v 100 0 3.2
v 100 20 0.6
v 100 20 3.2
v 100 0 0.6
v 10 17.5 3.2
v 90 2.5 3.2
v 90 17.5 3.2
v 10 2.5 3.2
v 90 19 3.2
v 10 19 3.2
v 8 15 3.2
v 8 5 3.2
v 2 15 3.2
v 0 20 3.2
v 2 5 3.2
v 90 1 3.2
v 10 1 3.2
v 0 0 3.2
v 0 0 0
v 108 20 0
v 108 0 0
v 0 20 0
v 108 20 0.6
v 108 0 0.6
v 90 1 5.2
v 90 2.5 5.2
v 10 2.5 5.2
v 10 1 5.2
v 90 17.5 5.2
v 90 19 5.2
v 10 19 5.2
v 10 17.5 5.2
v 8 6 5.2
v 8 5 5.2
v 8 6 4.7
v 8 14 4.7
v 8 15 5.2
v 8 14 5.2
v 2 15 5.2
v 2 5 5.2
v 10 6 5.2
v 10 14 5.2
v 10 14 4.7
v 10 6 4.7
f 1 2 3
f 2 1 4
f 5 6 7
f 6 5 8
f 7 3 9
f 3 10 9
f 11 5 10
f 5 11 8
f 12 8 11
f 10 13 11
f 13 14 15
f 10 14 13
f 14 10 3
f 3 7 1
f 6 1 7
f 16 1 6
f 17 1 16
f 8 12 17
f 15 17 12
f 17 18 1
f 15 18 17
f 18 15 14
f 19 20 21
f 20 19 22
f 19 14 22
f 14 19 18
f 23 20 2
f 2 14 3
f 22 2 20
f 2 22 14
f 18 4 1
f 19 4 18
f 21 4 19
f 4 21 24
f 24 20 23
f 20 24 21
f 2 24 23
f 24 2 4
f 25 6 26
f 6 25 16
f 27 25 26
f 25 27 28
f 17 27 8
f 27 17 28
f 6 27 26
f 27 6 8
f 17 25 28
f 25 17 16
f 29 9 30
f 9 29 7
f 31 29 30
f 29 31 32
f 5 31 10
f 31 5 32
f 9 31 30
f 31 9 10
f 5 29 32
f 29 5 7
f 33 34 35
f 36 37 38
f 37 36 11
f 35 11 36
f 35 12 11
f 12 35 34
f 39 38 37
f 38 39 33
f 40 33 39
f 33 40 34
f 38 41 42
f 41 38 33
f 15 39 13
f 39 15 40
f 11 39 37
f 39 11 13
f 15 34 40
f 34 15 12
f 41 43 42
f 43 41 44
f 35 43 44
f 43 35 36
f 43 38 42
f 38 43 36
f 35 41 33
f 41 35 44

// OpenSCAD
// Bag clip living hinge, PETG, 0.4 nozzle, no supports.
// Two halves contacting at hinge mid-plane, open flat pose.
// Fold map 180 about pivot: F(x)=216-x, F(z)=10.4-z.

part = "arm_lower"; // [arm_lower, arm_upper, assembly]
cadverify_only = "";

Lbody = 100;
Wbody = 20;
Tbody = 3.2;
Hhalf = 8;
Thinge = 0.6;
Bgap = 2.0;

module instance(name, part, unit = 1) {
    echo(cadverify_instance = [name, part, unit]);
    if (cadverify_only == "" || cadverify_only == name) children();
}

module arm_lower() {
    cube([100, 20, 3.2], false);
    translate([99.9, 0, 0]) cube([8.1, 20, 0.6], false);
    translate([10, 1, 3.1]) cube([80, 1.5, 2.1], false);
    translate([10, 17.5, 3.1]) cube([80, 1.5, 2.1], false);
    translate([2, 5, 3.1]) cube([6, 10, 2.1], false);
    translate([7.9, 6, 4.7]) cube([2.1, 8, 0.5], false);
}

module arm_upper() {
    cube([8.1, 20, 0.6], false);
    translate([7.9, 0, 0]) cube([100.1, 20, 3.2], false);
    translate([100, 5, 3.1]) cube([6, 10, 3.1], false);
    translate([97.9, 6, 5.7]) cube([2.5, 8, 0.5], false);
    translate([107.9, 6, 0]) cube([8.1, 8, 3.2], false);
}

if (part == "arm_lower") {
    echo(cadverify_spec = [
        ["bounds", [[0, 0, 0], [108, 20, 5.2]]],
        ["bodies", 1],
        ["through_holes", 0],
        ["support_faces", [["bed", "-z", 1500]]],
        ["overhangs_allowed", [["latch lip", [[7.5, 5.5, 4.5], [10.5, 14.5, 5.5]]]]],
        ["copies", 1],
        ["details", [
            ["arm", "material", [[30, 8, 1.2], [70, 12, 2.0]], 1],
            ["arm_wall", "thickness", [50, 10, 10], [0, 0, -1], 3.2],
            ["hinge", "thickness", [104, 10, 5], [0, 0, -1], 0.6],
            ["rib", "material", [[30, 1.3, 3.8], [70, 2.2, 4.8]], 1],
            ["rib2", "material", [[30, 17.8, 3.8], [70, 18.7, 4.8]], 1],
            ["latch_tower", "material", [[3, 7, 3.8], [7, 13, 5.0]], 1],
            ["latch_lip", "material", [[8.3, 7, 4.8], [9.6, 13, 5.1]], 1],
            ["bag_slot", "void", [[30, 4, 3.8], [70, 16, 5.0]], 1]
        ]]
    ]);
    arm_lower();
} else if (part == "arm_upper") {
    echo(cadverify_spec = [
        ["bounds", [[0, 0, 0], [116, 20, 6.2]]],
        ["bodies", 1],
        ["through_holes", 0],
        ["support_faces", [["bed", "-z", 1500]]],
        ["overhangs_allowed", [["latch lip", [[97.5, 5.5, 5.5], [100.8, 14.5, 6.5]]]]],
        ["copies", 1],
        ["details", [
            ["arm", "material", [[30, 8, 1.2], [70, 12, 2.0]], 1],
            ["arm_wall", "thickness", [50, 10, 10], [0, 0, -1], 3.2],
            ["hinge", "thickness", [4, 10, 5], [0, 0, -1], 0.6],
            ["latch_tower", "material", [[101, 7, 4.0], [105, 13, 5.5]], 1],
            ["latch_lip", "material", [[98.3, 7, 5.8], [99.9, 13, 6.1]], 1],
            ["thumb_tab", "material", [[109, 7, 1.0], [114, 13, 2.2]], 1],
            ["field", "void", [[30, 4, 3.8], [70, 16, 5.0]], 1]
        ]]
    ]);
    arm_upper();
} else if (part == "assembly") {
    echo(cadverify_spec = [
        ["bounds", [[0, 0, 0], [224, 20, 6.2]]],
        ["support_faces", [["bed", "-z", 3000]]],
        ["motions", [
            ["close", ["upper"], "rotate", [108, 10, 5.2], [0, -1, 0], [0, 180],
                ["flex", [["upper", "lower", 1.0, "latch snap"]]],
                ["stops", [180]],
                ["rests", [0, 180]]
            ]
        ]],
        ["assembly_order", [
            [["lower"], [0, 0, 0]],
            [["upper"], [0, 0, -1]]
        ]]
    ]);
    instance("lower", "arm_lower") arm_lower();
    instance("upper", "arm_upper") translate([108, 0, 0]) arm_upper();
}
